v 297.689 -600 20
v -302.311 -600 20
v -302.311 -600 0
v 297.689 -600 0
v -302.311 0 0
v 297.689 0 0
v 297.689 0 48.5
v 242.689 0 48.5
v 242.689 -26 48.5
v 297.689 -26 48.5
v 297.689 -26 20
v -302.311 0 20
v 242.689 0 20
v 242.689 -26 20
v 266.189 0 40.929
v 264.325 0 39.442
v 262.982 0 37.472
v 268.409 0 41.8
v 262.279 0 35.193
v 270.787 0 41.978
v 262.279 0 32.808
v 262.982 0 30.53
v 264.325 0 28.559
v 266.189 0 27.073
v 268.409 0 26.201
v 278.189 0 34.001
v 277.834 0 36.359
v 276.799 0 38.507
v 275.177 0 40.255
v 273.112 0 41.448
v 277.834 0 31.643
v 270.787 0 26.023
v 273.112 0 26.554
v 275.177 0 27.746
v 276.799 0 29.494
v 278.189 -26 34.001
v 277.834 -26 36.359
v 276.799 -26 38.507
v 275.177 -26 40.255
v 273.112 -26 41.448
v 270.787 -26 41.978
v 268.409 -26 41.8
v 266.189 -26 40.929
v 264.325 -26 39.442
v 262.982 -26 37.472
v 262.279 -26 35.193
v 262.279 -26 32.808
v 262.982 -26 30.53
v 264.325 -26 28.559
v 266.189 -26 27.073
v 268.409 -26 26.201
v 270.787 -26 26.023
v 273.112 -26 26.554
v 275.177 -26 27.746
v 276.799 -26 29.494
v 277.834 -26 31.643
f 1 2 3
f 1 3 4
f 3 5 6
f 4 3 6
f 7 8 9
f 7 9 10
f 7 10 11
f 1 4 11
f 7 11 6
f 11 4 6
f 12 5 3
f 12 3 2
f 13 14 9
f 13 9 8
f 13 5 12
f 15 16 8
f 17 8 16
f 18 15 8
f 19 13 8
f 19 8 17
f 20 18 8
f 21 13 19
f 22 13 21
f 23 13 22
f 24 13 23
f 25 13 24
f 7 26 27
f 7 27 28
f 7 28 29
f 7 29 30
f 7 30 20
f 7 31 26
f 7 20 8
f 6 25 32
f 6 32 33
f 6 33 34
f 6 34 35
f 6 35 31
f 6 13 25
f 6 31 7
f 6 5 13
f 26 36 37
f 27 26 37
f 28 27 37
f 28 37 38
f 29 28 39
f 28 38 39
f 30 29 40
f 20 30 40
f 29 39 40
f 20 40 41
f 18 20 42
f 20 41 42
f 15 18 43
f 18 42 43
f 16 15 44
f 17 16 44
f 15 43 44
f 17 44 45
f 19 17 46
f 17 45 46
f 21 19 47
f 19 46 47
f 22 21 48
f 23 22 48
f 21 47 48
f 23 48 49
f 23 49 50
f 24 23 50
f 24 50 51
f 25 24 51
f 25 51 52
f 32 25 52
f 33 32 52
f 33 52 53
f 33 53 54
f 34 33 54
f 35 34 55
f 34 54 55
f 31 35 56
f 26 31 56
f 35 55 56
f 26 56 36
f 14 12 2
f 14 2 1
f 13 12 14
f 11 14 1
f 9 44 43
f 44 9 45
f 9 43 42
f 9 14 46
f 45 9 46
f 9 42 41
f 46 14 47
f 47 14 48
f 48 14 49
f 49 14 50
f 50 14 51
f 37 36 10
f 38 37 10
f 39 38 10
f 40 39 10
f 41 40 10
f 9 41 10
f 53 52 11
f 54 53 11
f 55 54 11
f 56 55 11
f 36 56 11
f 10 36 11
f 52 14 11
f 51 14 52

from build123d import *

# Parameters (mm, degrees)
F0_W     = 600
F0_H     = 20
F1_DEPTH = 600
F2_W     = 55
F2_H     = 26
F3_DEPTH = 28.5
F4_R     = 8
F5_DEPTH = 26


with BuildPart() as f1:
    # F0 (on Front) → F1 (new body)
    with BuildSketch(Plane.XZ):
        with Locations((-2.310631, 10)):
            Rectangle(F0_W, F0_H)
    extrude(amount=F1_DEPTH)

    # F2 (on face) → F3 (join)
    with BuildSketch(Plane.XY.offset(20)):
        with Locations((270.189369, -13)):
            Rectangle(F2_W, F2_H)
    extrude(amount=F3_DEPTH)

    # F4 (on face) → F5 (cut, through all)
    with BuildSketch(Plane.XZ.offset(26)):
        with Locations((270.189369, 34.000836)):
            Circle(F4_R)
    extrude(amount=-F5_DEPTH, mode=Mode.SUBTRACT)


solid = f1.part
